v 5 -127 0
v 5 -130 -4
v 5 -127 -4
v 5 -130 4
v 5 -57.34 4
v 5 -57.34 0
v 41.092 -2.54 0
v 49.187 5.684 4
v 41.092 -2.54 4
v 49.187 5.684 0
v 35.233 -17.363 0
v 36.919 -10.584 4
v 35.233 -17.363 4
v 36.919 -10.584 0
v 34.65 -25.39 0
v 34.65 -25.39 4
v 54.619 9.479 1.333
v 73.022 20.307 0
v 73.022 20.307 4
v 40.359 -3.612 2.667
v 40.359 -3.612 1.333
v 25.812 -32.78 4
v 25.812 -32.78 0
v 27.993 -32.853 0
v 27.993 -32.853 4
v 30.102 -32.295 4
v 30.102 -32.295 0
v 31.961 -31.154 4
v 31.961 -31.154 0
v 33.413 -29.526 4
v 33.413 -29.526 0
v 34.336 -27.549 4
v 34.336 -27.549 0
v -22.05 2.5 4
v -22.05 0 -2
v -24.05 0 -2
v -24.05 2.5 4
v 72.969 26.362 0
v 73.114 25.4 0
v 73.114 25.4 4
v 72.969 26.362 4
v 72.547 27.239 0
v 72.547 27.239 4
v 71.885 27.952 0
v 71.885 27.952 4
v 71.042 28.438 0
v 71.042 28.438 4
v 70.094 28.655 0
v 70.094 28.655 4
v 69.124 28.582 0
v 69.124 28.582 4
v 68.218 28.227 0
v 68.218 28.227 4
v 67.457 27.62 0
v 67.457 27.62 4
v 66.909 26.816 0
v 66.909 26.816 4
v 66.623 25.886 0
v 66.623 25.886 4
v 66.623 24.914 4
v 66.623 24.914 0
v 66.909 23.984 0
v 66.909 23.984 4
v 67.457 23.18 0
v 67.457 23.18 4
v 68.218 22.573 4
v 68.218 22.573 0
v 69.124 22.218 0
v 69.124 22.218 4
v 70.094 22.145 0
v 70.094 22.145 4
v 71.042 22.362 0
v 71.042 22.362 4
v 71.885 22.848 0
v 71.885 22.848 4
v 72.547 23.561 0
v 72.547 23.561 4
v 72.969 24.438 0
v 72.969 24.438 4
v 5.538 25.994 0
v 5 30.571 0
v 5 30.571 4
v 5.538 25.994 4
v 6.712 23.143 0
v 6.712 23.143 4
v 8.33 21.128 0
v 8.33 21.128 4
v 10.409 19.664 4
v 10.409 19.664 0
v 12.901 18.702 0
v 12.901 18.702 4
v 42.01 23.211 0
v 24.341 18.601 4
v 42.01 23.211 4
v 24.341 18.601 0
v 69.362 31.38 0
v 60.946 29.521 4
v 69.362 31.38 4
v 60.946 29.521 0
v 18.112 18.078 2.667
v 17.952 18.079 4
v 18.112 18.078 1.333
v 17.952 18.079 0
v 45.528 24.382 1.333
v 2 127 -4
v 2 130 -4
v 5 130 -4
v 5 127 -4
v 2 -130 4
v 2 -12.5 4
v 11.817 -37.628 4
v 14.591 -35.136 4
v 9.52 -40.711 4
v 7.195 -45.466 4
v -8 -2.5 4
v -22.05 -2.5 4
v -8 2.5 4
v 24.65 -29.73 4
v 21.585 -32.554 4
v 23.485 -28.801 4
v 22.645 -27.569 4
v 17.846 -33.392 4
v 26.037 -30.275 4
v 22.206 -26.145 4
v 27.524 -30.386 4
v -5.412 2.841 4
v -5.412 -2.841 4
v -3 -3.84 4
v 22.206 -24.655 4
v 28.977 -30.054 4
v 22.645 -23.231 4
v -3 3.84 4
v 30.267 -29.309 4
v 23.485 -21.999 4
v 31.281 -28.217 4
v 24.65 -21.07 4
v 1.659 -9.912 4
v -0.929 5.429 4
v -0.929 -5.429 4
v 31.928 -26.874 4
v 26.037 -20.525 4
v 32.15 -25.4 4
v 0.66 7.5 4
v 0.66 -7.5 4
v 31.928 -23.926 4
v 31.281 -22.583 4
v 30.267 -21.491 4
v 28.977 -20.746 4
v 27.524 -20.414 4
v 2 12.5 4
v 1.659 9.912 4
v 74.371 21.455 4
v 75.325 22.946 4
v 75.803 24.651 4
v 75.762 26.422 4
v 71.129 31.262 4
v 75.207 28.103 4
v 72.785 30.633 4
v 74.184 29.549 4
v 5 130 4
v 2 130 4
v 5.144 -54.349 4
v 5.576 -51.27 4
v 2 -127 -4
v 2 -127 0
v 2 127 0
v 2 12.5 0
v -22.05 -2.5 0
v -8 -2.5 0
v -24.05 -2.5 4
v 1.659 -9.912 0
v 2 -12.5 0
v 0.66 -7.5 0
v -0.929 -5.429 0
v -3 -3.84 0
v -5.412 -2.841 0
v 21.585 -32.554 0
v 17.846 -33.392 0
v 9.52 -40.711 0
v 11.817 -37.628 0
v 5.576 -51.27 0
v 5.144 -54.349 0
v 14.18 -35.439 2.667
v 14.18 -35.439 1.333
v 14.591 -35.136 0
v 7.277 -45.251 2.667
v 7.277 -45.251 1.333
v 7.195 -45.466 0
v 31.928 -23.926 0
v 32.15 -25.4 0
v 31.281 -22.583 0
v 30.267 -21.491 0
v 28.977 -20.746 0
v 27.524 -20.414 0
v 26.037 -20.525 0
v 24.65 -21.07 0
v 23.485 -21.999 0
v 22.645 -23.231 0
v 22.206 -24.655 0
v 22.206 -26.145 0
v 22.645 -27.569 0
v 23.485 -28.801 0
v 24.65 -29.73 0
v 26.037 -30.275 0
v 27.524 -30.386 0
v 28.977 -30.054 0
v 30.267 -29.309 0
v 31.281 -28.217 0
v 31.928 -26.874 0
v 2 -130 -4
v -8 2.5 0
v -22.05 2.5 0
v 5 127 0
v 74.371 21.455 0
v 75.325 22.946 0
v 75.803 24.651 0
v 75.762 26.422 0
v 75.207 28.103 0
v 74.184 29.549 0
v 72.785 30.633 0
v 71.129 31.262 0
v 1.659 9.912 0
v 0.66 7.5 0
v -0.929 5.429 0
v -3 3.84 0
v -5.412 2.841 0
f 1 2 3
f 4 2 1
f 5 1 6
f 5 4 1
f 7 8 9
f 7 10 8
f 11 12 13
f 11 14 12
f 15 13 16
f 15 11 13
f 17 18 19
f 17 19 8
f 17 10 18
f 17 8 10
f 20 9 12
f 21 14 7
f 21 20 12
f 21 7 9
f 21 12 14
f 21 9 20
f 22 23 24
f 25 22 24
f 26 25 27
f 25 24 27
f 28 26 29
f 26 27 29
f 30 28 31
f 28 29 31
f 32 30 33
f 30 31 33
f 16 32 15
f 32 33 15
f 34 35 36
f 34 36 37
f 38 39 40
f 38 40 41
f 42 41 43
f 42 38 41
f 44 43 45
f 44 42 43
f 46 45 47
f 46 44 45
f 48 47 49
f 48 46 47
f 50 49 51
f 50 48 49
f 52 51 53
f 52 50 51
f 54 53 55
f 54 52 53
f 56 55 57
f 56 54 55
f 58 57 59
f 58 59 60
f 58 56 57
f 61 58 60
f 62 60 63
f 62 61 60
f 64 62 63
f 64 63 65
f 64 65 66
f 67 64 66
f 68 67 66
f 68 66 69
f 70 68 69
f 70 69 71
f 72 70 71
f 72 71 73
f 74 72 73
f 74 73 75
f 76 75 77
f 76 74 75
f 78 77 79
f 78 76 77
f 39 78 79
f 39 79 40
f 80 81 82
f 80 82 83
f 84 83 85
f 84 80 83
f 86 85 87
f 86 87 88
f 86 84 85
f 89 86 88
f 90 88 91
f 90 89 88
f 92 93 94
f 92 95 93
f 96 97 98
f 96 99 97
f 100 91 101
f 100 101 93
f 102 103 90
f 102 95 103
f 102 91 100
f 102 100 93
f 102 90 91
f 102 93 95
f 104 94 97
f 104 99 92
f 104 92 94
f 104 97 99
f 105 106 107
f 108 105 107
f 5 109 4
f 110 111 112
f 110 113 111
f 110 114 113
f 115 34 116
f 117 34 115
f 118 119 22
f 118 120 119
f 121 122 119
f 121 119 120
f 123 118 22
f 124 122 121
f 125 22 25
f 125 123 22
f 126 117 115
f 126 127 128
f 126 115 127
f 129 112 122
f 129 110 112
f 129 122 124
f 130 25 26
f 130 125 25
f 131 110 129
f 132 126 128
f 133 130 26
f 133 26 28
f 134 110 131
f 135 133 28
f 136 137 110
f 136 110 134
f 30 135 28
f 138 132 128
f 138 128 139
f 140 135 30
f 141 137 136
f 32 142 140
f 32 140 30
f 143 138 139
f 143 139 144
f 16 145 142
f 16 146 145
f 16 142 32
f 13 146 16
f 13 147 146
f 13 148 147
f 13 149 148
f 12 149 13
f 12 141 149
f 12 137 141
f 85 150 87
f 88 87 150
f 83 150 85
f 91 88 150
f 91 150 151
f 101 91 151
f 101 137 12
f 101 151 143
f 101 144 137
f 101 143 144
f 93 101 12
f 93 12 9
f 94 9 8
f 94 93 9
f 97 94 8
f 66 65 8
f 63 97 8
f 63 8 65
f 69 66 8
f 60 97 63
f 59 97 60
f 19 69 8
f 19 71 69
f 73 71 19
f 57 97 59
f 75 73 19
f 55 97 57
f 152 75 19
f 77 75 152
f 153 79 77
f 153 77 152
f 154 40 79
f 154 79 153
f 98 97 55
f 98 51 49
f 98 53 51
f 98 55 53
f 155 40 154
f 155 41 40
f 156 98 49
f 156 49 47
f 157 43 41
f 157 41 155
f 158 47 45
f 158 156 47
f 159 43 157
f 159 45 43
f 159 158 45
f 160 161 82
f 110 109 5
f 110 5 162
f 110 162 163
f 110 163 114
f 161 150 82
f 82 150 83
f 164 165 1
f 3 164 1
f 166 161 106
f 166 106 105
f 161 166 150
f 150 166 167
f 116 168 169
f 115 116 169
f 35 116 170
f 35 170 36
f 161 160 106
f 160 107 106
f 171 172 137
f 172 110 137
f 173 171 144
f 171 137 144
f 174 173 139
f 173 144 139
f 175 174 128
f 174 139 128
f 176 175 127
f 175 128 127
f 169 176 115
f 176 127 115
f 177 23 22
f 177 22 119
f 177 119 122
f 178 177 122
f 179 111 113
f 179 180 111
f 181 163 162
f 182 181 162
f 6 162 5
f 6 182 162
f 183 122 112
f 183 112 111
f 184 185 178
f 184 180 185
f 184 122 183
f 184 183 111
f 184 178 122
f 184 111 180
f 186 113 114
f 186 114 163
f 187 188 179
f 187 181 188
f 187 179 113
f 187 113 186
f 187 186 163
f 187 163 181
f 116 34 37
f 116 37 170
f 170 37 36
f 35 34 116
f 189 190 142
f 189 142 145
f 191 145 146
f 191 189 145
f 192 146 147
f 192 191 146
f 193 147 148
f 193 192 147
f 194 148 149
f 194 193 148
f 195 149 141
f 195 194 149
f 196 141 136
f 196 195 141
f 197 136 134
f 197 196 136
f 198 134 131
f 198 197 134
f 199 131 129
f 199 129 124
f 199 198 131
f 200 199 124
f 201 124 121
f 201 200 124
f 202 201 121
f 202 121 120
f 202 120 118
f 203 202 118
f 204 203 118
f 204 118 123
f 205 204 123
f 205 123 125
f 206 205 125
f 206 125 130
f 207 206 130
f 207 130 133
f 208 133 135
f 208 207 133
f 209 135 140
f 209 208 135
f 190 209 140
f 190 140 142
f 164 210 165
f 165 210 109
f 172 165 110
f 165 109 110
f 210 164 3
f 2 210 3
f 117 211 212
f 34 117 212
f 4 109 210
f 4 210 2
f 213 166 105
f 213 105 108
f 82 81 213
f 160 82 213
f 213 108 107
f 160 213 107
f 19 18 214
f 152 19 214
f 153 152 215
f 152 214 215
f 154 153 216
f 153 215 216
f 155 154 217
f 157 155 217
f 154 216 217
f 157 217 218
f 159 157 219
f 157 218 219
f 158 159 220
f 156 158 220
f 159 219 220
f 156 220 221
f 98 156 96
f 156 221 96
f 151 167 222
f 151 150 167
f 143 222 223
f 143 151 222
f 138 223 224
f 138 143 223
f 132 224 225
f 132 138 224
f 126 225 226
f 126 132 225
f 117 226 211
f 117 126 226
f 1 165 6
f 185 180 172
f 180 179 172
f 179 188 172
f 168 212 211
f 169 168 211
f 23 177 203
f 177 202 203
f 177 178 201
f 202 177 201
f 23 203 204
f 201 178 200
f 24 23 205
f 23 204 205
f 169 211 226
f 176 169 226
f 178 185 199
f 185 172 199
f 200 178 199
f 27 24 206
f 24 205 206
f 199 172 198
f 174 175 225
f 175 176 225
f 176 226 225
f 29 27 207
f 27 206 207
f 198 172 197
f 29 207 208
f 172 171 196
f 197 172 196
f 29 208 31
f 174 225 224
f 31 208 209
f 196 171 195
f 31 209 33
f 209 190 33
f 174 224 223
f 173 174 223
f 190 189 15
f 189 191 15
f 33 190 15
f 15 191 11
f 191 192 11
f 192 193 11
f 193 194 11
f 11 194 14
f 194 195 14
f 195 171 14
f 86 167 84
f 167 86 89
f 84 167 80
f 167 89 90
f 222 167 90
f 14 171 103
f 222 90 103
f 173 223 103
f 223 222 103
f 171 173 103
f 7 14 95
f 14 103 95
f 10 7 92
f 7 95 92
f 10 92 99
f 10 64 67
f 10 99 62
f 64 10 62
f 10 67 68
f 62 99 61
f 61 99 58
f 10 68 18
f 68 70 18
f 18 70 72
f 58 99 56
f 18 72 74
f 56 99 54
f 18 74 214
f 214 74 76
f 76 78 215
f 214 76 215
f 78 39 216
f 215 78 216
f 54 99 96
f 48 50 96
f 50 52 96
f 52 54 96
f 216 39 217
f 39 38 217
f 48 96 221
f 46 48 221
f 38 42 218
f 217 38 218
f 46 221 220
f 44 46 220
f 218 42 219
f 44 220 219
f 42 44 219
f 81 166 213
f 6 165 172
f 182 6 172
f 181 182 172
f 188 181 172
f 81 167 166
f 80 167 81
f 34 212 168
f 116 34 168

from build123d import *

# Parameters (mm, degrees)
MAIN_FEATURES_SKETCH_R   = 3.2639
MAIN_FEATURES_SKETCH_R_2 = 5
MAIN_BODY_DEPTH          = 4
SKETCH1_3_W              = 3
SKETCH1_3_H              = 3
ALIGNMENT_TABS_DEPTH     = 4
ARROW_DEPTH              = 2
FILLET1_R                = 10


with BuildPart() as part:
    # main_features_sketch → main_body (new body)
    with BuildSketch(Plane.XY):
        with BuildLine():
            Line((5, -130), (5, -57.340148315))
            add(Edge.make_bspline(
                [(25.812302368, -32.779740175), (11.779287511, -30.236028568), (5, -45.738607792), (5, -57.340148315)],
                knots=[0, 0, 0, 0, 1, 1, 1, 1], degree=3))
            ThreePointArc((25.812302368, -32.779740175), (31.960860099, -31.153748787), (34.649993747, -25.390314881))
            add(Edge.make_bspline(
                [(73.022366869, 20.307251386), (54.015932593, 8.467793569), (34.613495749, 2.873121555), (34.649993747, -25.390314881)],
                knots=[0, 0, 0, 0, 1, 1, 1, 1], degree=3))
            ThreePointArc((73.022366869, 20.307251386), (75.546863703, 27.283014592), (69.36238197, 31.380152896))
            add(Edge.make_bspline(
                [(5, 30.570880007), (5, 2.644791948), (53.27872464, 30.068701259), (69.36238197, 31.380152896)],
                knots=[0, 0, 0, 0, 1, 1, 1, 1], degree=3))
            Line((5, 30.570880007), (5, 130))
            Line((5, 130), (2, 130))
            Line((2, 130), (2, 2.5))
            Line((2, 2.5), (-22.05, 2.5))
            Line((-22.05, 2.5), (-22.05, -2.5))
            Line((-22.05, -2.5), (2, -2.5))
            Line((2, -2.5), (2, -130))
            Line((2, -130), (5, -130))
        make_face()
        with Locations((69.85, 25.4)):
            Circle(MAIN_FEATURES_SKETCH_R, mode=Mode.SUBTRACT)
        with Locations((27.15, -25.4)):
            Circle(MAIN_FEATURES_SKETCH_R_2, mode=Mode.SUBTRACT)
    extrude(amount=MAIN_BODY_DEPTH)

    # Sketch1<3> → alignment_tabs (add)
    with BuildSketch(Plane.XY):
        with Locations((3.5, -128.5)):
            Rectangle(SKETCH1_3_W, SKETCH1_3_H)
        with Locations((3.5, 128.5)):
            Rectangle(SKETCH1_3_W, SKETCH1_3_H)
    extrude(amount=-ALIGNMENT_TABS_DEPTH)

    # Fillet1
    fillet1_edges = [part.edges().sort_by_distance(p)[0] for p in [
        (2, -2.5, 2),
        (2, 2.5, 2),
    ]]
    fillet(fillet1_edges, radius=FILLET1_R)


with BuildPart() as body_2:
    # arrow_sketch → arrow (new body)
    with BuildSketch(Plane.ZY.offset(22.05)):
        Polygon((4, -2.5), (-2, 0), (4, 2.5), align=None)
    extrude(amount=ARROW_DEPTH)


solid = Compound([part.part, body_2.part])
